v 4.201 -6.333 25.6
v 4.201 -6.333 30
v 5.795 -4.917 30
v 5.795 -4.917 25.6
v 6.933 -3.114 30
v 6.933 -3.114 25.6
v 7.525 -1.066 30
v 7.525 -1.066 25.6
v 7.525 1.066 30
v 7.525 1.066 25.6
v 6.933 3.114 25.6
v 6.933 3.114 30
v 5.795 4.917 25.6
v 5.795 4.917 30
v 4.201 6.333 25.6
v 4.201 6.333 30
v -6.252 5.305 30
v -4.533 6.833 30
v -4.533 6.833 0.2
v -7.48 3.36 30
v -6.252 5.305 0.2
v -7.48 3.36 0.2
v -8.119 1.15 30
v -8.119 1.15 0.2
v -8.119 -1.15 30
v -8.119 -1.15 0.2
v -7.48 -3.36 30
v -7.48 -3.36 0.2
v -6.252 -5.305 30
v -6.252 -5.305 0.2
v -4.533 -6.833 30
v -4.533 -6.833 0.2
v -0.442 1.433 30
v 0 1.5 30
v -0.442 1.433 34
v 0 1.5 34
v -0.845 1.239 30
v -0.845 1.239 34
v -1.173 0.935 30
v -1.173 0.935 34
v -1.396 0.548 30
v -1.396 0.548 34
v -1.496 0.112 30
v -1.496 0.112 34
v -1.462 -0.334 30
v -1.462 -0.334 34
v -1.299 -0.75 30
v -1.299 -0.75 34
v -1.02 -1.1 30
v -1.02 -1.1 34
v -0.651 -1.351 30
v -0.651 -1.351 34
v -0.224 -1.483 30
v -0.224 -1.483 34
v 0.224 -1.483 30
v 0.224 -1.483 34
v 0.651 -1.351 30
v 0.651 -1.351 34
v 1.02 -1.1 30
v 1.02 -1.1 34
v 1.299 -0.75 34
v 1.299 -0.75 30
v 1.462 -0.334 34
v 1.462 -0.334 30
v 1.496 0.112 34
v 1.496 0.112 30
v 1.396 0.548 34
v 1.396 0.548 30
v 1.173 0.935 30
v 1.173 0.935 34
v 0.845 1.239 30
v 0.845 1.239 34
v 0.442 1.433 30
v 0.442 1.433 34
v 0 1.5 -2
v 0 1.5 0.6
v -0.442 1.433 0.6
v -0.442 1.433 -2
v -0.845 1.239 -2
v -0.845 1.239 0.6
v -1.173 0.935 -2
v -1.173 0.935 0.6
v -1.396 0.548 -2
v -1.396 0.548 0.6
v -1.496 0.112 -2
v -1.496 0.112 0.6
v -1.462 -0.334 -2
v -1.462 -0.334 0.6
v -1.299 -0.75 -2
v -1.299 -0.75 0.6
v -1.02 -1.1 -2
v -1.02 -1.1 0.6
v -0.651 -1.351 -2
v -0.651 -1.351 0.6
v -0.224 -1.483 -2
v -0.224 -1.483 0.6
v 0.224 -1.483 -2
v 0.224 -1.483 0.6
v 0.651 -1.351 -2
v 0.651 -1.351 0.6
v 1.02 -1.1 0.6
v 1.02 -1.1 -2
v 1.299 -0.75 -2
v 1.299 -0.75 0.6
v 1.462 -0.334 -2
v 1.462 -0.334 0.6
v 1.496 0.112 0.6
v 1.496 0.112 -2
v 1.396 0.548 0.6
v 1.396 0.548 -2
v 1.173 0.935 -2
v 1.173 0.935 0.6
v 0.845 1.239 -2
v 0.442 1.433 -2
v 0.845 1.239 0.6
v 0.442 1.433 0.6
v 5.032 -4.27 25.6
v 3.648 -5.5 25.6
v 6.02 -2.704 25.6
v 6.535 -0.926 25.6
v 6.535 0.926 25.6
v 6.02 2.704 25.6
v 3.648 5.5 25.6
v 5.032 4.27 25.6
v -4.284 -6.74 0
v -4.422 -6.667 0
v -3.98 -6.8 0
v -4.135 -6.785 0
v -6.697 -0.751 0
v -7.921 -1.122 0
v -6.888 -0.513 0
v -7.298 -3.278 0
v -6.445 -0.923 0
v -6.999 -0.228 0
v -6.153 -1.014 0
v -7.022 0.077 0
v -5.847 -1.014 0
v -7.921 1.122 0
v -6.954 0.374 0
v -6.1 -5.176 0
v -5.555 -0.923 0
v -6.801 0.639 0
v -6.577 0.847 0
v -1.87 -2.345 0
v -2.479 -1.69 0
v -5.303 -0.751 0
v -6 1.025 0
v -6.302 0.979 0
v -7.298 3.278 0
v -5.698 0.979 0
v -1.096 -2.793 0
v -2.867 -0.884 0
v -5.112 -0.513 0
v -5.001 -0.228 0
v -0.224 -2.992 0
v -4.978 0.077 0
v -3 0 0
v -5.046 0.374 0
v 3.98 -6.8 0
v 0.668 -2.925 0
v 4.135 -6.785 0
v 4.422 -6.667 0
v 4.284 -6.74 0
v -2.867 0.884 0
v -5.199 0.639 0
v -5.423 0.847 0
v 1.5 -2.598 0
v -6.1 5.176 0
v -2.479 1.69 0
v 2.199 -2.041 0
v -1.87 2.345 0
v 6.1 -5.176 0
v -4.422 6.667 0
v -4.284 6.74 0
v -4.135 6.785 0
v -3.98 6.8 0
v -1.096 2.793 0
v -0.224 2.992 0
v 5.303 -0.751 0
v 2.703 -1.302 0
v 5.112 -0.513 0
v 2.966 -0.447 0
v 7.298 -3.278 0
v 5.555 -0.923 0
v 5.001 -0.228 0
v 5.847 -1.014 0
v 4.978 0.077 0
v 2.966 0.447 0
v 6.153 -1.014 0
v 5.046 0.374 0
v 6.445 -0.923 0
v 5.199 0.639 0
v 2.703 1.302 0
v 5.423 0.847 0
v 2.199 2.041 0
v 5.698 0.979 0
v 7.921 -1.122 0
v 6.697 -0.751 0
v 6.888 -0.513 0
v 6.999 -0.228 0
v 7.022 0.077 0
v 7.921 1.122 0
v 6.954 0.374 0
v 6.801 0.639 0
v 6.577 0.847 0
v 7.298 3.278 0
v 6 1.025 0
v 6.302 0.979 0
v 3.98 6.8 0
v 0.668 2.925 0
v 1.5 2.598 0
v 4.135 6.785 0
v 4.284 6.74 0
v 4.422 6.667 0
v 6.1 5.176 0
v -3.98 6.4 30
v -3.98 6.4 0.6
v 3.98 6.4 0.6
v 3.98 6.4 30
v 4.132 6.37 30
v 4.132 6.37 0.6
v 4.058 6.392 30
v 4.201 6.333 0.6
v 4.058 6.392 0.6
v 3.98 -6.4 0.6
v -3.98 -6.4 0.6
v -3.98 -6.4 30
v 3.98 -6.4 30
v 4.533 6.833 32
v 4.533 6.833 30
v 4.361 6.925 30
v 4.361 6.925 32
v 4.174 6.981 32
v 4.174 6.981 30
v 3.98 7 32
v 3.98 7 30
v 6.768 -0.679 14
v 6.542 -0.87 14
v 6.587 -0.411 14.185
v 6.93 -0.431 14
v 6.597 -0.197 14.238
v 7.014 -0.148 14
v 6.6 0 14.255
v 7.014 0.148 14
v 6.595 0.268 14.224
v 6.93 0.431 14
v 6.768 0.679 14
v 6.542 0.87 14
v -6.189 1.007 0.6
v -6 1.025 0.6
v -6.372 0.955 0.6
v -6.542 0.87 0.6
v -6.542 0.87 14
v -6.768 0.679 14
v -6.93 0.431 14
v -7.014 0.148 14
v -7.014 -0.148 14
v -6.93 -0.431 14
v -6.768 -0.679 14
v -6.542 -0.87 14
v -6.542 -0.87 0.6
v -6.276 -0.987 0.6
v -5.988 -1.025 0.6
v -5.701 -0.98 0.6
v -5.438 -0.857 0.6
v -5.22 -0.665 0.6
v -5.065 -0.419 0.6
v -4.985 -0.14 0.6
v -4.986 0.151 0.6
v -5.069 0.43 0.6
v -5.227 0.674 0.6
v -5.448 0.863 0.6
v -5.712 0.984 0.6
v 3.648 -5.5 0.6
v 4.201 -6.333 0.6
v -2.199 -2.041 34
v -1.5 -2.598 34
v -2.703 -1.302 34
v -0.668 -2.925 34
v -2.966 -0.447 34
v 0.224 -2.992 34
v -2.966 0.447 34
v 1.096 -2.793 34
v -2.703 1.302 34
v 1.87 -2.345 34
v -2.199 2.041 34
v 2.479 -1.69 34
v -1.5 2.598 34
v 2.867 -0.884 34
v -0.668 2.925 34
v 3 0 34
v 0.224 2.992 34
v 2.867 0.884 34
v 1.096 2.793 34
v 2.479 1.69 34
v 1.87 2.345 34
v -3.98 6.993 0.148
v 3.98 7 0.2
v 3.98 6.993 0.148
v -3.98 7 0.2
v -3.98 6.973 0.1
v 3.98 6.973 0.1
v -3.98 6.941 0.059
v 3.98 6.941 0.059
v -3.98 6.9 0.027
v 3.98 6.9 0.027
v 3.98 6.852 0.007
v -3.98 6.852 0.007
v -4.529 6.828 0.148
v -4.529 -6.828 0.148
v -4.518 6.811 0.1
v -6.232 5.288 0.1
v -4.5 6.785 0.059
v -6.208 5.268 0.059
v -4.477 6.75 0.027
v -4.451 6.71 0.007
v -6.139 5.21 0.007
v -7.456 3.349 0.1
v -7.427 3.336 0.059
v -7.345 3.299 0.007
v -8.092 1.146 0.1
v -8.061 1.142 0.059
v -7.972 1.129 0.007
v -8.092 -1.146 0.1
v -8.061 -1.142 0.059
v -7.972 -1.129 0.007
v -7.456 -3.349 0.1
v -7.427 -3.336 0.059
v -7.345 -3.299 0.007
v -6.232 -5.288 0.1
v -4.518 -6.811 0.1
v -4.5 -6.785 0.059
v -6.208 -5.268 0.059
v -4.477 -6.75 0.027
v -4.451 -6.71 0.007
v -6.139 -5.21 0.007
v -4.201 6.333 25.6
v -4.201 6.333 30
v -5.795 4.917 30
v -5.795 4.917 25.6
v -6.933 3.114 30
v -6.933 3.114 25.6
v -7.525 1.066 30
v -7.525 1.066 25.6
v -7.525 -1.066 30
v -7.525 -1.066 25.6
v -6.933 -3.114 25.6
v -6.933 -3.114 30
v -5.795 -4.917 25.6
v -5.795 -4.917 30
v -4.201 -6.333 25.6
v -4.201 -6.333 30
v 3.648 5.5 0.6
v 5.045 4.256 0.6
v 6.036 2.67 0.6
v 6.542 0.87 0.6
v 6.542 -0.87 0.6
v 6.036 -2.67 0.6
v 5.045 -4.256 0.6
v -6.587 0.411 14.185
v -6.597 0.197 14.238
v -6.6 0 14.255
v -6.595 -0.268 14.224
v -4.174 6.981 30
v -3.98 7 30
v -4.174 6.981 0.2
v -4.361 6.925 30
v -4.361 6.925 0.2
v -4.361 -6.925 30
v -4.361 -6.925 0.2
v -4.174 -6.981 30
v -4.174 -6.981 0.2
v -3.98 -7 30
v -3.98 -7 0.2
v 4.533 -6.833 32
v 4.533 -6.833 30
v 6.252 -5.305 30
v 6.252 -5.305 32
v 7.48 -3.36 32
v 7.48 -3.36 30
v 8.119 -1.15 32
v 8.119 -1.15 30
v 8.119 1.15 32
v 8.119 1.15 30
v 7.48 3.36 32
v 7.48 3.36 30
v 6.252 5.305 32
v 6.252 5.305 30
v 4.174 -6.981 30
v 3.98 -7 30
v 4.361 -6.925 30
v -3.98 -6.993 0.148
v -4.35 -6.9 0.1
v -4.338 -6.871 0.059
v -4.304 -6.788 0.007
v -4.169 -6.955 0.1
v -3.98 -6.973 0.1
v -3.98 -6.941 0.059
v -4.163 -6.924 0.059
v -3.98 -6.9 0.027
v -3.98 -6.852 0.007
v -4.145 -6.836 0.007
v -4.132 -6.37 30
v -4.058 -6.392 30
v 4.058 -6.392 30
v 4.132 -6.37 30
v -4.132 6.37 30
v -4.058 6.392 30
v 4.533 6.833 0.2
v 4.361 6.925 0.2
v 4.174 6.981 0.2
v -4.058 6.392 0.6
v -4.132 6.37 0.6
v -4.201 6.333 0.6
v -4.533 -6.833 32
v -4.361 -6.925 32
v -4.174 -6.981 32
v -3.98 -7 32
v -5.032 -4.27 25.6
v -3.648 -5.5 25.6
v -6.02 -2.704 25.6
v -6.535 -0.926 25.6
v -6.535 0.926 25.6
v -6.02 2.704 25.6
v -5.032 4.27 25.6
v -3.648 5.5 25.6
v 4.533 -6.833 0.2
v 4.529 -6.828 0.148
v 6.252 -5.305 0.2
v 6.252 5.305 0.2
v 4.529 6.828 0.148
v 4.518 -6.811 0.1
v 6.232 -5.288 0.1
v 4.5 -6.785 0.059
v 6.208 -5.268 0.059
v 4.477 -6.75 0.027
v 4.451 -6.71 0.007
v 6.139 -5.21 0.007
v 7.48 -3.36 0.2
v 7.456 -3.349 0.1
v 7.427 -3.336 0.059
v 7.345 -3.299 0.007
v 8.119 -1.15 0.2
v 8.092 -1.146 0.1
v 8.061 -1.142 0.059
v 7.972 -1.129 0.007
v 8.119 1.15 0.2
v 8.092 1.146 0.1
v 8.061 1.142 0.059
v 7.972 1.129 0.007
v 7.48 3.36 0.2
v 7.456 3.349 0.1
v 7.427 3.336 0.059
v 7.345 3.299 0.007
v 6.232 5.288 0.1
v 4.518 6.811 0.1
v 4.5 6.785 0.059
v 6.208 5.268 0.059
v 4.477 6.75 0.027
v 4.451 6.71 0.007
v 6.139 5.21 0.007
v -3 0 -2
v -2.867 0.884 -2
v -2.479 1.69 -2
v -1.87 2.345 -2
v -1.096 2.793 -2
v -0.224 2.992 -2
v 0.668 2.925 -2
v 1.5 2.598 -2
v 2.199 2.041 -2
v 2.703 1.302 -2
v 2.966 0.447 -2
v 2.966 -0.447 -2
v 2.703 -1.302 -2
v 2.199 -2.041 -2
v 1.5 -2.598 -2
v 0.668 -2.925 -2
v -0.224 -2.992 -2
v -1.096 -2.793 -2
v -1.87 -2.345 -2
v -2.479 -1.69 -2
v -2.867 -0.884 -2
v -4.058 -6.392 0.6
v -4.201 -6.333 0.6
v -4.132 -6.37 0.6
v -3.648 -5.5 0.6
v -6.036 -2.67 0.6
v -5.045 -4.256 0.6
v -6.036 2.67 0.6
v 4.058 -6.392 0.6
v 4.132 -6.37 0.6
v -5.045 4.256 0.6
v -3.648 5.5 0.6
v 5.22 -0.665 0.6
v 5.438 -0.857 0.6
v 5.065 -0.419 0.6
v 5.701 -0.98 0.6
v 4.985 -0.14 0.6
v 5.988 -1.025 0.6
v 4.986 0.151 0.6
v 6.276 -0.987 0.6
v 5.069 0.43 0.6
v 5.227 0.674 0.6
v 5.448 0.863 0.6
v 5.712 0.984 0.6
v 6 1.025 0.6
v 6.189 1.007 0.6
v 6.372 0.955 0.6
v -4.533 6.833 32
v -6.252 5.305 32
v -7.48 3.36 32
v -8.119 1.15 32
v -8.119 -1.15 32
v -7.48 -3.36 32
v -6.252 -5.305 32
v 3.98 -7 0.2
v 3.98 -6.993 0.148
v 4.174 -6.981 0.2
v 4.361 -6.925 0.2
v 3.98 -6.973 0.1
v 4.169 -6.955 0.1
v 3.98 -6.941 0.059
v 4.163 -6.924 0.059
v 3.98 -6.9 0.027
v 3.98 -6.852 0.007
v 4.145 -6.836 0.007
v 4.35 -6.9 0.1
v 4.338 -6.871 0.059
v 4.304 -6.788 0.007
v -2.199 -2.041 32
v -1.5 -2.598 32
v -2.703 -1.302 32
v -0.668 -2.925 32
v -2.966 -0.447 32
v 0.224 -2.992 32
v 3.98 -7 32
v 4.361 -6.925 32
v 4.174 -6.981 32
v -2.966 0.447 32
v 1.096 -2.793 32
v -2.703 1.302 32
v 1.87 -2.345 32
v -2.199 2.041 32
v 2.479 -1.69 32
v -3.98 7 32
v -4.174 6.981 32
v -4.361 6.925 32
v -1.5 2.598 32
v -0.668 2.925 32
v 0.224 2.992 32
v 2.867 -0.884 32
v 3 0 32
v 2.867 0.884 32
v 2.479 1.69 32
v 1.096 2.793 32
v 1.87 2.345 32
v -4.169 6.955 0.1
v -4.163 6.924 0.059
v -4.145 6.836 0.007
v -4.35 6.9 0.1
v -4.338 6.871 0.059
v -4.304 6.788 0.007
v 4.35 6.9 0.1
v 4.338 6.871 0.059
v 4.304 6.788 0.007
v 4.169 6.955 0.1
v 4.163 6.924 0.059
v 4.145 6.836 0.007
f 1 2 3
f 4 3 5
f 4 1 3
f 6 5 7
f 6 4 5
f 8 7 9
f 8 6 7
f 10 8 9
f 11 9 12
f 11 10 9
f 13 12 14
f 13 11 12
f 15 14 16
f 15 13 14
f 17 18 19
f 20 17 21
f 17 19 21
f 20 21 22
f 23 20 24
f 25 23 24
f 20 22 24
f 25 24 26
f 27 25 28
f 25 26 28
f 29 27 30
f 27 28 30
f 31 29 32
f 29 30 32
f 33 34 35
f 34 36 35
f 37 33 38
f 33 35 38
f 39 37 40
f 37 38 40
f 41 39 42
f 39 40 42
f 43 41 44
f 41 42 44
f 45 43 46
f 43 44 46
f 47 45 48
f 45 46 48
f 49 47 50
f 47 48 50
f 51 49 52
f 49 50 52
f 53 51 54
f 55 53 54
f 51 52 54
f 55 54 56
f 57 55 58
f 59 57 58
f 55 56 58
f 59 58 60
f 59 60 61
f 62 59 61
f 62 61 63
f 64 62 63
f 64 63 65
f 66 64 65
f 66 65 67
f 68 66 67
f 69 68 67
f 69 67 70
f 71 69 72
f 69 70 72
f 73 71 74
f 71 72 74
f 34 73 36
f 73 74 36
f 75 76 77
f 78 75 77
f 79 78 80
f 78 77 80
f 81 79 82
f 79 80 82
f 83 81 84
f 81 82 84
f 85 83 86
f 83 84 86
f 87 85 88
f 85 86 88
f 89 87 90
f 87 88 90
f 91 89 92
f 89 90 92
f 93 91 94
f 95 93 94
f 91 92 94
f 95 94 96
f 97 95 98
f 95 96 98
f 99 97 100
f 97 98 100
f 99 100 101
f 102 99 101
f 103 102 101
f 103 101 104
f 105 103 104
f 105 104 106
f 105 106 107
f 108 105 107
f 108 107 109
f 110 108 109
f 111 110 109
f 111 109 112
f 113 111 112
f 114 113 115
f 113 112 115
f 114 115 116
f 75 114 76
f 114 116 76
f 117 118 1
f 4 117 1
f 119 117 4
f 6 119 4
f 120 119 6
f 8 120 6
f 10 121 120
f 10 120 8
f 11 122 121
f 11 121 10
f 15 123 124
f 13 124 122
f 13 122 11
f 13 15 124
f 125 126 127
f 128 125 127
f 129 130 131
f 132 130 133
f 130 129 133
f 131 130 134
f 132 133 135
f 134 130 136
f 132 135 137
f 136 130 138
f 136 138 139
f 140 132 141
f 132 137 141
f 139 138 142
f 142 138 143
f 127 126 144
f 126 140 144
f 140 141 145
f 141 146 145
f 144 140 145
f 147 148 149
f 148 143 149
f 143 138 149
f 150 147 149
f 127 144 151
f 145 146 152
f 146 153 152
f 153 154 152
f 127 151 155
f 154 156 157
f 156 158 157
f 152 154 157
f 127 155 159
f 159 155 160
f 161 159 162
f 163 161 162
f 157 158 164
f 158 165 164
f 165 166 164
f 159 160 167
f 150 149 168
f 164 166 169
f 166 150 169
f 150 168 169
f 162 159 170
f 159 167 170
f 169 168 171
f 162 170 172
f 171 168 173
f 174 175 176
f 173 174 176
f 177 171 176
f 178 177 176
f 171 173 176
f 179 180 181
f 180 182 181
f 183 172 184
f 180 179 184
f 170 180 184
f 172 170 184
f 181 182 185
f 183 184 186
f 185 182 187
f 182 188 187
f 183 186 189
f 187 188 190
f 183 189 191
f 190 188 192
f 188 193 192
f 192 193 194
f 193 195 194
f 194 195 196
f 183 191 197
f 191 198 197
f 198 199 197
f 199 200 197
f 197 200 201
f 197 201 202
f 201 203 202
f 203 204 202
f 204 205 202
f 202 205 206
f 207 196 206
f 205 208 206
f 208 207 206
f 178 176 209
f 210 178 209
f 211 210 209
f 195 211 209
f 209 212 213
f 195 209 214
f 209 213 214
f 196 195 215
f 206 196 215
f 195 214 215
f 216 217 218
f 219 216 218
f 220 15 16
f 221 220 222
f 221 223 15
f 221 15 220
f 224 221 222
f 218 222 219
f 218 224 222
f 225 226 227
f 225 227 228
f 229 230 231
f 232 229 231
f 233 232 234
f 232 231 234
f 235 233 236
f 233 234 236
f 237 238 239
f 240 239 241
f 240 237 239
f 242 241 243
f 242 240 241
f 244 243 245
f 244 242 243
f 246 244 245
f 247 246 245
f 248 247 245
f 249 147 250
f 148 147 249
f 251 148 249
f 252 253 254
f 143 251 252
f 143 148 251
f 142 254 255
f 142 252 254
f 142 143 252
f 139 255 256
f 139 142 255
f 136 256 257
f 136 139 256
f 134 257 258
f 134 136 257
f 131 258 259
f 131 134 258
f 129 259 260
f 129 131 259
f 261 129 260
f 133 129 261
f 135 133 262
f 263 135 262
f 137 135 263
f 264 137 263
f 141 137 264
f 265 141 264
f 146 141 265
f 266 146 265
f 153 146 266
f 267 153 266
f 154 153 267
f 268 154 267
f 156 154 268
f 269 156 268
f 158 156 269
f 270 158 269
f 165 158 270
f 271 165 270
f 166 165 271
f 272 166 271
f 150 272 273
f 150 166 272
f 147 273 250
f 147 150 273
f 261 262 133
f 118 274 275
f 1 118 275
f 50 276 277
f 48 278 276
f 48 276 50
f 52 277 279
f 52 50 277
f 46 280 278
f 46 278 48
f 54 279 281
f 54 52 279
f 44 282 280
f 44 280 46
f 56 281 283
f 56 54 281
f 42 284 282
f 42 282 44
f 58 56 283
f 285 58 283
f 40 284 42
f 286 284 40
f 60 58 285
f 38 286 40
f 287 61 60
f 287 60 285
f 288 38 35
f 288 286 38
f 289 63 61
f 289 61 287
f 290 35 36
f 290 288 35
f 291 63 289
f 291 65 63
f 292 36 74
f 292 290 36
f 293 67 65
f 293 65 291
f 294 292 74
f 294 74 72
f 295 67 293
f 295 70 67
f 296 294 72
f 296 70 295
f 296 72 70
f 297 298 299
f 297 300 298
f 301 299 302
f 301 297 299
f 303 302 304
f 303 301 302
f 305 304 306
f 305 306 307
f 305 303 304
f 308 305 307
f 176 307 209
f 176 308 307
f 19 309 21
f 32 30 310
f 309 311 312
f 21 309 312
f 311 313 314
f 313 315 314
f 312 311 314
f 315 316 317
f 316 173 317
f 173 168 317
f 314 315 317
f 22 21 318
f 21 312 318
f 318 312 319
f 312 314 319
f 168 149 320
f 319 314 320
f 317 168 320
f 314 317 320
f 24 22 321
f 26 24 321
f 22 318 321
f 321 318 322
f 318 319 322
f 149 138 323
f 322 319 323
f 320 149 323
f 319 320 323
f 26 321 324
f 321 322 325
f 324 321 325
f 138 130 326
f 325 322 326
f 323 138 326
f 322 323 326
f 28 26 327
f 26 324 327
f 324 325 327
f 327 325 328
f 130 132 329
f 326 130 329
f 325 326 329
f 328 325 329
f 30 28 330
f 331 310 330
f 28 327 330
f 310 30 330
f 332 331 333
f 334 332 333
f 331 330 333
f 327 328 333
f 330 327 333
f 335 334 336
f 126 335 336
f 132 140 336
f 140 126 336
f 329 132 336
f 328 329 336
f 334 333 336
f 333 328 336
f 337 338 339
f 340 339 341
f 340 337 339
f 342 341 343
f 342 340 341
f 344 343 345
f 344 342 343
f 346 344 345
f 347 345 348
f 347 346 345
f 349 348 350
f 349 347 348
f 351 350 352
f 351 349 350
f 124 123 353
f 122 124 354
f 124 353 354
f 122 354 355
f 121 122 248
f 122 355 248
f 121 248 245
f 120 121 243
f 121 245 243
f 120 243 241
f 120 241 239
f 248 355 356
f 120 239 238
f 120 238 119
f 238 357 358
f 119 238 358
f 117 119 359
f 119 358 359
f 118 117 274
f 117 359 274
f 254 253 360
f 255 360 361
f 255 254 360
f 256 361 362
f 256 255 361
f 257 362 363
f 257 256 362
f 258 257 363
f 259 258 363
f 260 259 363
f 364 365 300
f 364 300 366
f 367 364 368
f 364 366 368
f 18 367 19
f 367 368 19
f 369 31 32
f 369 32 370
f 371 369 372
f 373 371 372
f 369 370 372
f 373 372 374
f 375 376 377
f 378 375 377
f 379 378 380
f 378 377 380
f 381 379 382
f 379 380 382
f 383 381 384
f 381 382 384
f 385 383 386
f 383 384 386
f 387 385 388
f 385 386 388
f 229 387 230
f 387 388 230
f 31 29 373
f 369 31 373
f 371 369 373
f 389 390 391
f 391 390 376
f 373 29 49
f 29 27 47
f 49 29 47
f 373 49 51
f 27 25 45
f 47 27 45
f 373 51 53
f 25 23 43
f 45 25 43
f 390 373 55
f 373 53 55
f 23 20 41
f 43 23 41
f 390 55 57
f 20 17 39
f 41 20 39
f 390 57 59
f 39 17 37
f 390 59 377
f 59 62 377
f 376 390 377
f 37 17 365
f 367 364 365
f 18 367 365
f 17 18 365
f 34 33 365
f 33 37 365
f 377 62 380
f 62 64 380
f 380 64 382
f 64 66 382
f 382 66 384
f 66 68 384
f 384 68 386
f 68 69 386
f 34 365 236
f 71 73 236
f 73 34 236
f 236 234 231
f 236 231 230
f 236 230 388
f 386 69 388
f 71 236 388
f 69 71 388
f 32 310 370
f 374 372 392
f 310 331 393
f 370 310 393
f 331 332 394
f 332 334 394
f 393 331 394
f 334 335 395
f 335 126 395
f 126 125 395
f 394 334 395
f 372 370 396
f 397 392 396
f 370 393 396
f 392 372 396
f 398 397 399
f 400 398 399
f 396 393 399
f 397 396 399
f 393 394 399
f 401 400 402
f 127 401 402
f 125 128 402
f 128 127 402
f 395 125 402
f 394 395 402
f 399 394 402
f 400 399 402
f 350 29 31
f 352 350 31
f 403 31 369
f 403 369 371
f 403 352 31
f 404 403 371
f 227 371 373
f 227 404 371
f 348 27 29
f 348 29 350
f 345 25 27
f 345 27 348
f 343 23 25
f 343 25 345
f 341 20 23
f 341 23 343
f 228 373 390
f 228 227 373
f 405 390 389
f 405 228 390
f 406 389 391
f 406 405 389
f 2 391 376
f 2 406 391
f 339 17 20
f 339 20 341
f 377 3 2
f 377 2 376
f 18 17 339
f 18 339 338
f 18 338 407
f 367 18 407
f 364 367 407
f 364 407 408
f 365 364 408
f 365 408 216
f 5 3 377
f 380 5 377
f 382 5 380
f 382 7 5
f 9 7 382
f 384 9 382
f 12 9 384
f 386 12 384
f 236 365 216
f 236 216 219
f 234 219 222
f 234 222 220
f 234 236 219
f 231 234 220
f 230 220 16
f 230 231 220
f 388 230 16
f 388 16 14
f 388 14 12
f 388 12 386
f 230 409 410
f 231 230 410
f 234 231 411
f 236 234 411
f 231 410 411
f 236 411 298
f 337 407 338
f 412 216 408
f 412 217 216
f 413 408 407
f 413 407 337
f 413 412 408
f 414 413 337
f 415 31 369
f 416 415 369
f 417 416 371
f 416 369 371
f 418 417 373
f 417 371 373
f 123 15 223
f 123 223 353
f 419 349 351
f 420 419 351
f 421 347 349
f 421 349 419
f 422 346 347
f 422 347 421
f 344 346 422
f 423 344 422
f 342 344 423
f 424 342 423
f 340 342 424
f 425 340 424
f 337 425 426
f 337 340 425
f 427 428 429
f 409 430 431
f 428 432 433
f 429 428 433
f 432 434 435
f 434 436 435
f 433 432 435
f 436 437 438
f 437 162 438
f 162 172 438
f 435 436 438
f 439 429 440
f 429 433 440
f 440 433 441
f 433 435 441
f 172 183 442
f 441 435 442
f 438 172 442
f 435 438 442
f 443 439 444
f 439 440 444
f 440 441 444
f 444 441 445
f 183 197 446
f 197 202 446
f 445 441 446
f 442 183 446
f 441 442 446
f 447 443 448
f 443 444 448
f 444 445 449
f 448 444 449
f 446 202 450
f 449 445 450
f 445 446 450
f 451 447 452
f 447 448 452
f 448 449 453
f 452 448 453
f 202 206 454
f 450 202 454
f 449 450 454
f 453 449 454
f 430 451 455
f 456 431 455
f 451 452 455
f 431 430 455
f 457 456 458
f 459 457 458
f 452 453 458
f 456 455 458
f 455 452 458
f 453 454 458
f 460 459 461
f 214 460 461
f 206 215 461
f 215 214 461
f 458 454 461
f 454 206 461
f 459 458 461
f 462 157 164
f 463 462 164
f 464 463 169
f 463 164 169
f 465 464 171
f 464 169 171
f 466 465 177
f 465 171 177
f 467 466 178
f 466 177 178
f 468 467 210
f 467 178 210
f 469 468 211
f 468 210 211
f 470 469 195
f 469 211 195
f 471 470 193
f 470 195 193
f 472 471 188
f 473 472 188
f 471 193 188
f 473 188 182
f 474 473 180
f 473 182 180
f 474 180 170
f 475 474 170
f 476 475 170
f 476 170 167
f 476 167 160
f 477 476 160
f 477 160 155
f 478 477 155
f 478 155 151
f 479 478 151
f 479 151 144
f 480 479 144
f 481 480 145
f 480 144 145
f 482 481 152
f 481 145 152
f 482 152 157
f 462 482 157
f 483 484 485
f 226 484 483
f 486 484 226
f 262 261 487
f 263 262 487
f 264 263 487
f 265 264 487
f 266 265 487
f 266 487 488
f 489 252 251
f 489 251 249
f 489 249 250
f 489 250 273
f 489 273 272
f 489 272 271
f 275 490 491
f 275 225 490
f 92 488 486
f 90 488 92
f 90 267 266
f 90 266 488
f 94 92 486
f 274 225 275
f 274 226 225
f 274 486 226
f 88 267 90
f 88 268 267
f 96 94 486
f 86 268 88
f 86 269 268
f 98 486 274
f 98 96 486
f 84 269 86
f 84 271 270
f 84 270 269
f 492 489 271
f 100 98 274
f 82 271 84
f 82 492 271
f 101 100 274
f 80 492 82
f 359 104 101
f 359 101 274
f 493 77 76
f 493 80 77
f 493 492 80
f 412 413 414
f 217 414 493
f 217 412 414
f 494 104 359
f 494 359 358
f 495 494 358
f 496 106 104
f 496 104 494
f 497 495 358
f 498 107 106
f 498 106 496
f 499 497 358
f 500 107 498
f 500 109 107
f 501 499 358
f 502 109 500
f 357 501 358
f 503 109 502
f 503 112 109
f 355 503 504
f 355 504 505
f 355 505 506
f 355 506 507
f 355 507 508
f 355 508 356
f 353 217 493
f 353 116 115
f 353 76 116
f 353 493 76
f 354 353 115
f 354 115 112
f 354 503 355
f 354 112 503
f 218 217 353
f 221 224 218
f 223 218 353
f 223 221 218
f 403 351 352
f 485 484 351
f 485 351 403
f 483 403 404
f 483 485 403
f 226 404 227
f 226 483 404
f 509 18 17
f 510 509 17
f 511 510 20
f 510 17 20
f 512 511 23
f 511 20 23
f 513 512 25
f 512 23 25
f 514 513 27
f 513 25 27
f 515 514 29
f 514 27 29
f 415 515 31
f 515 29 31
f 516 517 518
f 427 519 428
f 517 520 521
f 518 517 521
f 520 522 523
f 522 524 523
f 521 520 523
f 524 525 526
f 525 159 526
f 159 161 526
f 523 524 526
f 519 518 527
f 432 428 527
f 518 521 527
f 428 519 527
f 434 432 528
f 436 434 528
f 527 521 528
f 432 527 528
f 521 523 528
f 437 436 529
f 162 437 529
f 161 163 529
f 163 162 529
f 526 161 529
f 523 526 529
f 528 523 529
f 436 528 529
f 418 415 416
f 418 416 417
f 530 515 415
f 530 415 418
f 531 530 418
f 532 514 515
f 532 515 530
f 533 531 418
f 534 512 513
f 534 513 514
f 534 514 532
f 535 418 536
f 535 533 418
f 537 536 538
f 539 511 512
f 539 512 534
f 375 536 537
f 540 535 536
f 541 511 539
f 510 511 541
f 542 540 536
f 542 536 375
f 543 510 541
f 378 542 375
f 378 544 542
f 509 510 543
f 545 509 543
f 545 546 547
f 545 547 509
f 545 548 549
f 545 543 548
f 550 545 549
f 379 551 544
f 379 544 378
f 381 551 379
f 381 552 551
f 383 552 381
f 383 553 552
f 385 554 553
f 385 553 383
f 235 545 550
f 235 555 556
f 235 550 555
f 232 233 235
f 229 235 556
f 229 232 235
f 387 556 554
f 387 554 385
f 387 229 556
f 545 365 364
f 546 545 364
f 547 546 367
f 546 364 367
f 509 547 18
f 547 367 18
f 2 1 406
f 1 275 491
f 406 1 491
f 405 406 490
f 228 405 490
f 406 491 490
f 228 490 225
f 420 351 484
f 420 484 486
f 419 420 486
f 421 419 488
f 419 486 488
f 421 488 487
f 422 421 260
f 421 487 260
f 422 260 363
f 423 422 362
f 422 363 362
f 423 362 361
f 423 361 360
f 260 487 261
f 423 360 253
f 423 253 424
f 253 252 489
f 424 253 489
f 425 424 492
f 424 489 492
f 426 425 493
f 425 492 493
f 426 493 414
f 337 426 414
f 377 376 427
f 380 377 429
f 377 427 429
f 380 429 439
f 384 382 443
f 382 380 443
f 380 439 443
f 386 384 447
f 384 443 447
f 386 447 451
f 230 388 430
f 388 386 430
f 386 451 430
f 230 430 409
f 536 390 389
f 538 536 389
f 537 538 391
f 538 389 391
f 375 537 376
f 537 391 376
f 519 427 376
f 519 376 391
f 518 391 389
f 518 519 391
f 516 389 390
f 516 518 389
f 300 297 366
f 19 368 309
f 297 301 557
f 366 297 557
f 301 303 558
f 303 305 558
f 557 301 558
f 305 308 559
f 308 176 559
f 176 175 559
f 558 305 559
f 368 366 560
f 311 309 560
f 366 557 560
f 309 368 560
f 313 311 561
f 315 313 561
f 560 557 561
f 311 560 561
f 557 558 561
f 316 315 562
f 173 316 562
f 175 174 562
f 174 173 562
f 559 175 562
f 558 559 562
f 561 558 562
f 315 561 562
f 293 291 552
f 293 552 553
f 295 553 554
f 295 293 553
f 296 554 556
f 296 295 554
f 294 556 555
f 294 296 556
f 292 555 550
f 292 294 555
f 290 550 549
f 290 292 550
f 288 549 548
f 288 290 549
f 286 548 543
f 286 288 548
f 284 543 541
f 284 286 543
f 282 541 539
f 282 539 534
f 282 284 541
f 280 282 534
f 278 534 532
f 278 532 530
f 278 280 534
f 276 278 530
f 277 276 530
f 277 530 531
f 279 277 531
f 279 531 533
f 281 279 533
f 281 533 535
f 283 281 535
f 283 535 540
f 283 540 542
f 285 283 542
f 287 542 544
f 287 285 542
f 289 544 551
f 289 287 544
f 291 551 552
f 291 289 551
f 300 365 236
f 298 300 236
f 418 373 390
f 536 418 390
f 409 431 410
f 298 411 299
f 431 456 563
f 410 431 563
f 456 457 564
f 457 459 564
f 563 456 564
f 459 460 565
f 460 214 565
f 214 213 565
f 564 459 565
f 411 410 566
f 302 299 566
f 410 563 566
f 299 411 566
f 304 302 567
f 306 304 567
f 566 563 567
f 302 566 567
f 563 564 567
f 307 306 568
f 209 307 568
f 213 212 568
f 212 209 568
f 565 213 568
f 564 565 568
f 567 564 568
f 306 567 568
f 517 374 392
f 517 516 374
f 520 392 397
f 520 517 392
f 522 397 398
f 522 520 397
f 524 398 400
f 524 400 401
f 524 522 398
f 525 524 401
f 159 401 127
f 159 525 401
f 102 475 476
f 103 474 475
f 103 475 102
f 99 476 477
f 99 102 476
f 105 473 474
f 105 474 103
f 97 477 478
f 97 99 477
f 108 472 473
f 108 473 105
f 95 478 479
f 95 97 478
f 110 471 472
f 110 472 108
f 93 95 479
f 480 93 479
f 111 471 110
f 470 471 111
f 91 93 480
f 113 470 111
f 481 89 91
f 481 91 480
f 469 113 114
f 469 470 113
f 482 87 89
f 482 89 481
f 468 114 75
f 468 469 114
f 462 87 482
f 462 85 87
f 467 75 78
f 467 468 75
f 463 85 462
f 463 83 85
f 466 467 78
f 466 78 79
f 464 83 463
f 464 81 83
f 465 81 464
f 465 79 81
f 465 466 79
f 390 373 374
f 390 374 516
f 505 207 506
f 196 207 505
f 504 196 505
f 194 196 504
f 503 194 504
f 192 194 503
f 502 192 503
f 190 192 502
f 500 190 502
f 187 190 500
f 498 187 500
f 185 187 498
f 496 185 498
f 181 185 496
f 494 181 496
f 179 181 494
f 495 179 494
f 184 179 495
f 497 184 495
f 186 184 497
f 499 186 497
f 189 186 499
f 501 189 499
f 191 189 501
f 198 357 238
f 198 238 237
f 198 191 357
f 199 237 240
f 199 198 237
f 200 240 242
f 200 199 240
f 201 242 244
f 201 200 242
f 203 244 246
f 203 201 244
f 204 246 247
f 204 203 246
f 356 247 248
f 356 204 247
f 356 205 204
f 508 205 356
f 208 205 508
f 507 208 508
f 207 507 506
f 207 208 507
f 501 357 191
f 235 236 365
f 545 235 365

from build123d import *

# Parameters (mm, degrees)
SKETCH_1_R                    = 8.2
EXTRUDE_1_DEPTH               = 30
SKETCH_2_W                    = 19.841310119
SKETCH_2_H                    = 4.076981531
CUT_EXTRUDE_1_DEPTH           = 33.163333161
FILLET_1_R                    = 1
SHELL_1_T                     = -0.6
SKETCH_4_R                    = 3
EXTRUDE_2_DEPTH               = 2
EXTRUDE_1_2_DEPTH             = 25
EXTRUDE_3_DEPTH               = 2
EXTRUDE_START                 = 2
SKETCH_9_R                    = 3
EXTRUDE_4_DEPTH               = 2
SKETCH_6_W                    = 1.5
SKETCH_6_H                    = 36
FILLET_2_R                    = 0.2
HOLE_WIZARD_M2_5_1_AT_2_COUNT = 2
HOLE_WIZARD_M2_5_1_AT_2_PITCH = 12


with BuildPart() as part:
    # 草图1 → Extrude 1 (new body)
    with BuildSketch(Plane.XY):
        Circle(SKETCH_1_R)
    extrude(amount=EXTRUDE_1_DEPTH)

    # 草图2 → 切除-拉伸1 (cut, through all)
    with BuildSketch(Plane.XY.offset(30)):
        with Locations((0.815396306, 9.038490766)):
            Rectangle(SKETCH_2_W, SKETCH_2_H)
        with Locations((0.815396306, -9.038490766)):
            Rectangle(SKETCH_2_W, SKETCH_2_H)
    extrude(amount=-CUT_EXTRUDE_1_DEPTH, mode=Mode.SUBTRACT)

    # 圆角1
    fillet_1_edges = [part.edges().sort_by_distance(p)[0] for p in [
        (-4.270831301, 7, 15),
        (4.270831301, 7, 15),
        (4.270831301, -7, 15),
        (-4.270831301, -7, 15),
    ]]
    fillet(fillet_1_edges, radius=FILLET_1_R)

    # 抽壳1
    shell_1_openings = [part.faces().sort_by_distance(p)[0] for p in [
        (0, 0, 30),
    ]]
    offset(amount=SHELL_1_T, openings=shell_1_openings, kind=Kind.INTERSECTION)

    # 草图4 → 凸台-拉伸2 (add)
    with BuildSketch(Plane(origin=(0, 0, 0), x_dir=(-1, 0, 0), z_dir=(0, 0, -1))):
        Circle(SKETCH_4_R)
    extrude(amount=EXTRUDE_2_DEPTH)

    # 草图7 → Extrude 1 2 (add)
    with BuildSketch(Plane.XY.offset(0.6)):
        with BuildLine():
            ThreePointArc((-4.201058068, 6.333333333), (-7.6, 0), (-4.201058068, -6.333333333))
            Line((-4.201058068, -6.333333333), (-3.648287269, -5.5))
            ThreePointArc((-3.648287269, -5.5), (-6.6, 0), (-3.648287269, 5.5))
            Line((-3.648287269, 5.5), (-4.201058068, 6.333333333))
        make_face()
        with BuildLine():
            ThreePointArc((4.201058068, -6.333333333), (7.6, 0), (4.201058068, 6.333333333))
            Line((4.201058068, 6.333333333), (3.648287269, 5.5))
            ThreePointArc((3.648287269, 5.5), (6.6, 0), (3.648287269, -5.5))
            Line((3.648287269, -5.5), (4.201058068, -6.333333333))
        make_face()
    extrude(amount=EXTRUDE_1_2_DEPTH)


with BuildPart() as body_2:
    # 草图8 → 凸台-拉伸3 (new body)
    with BuildSketch(Plane.XY.offset(30)):
        with BuildLine():
            Line((-3.979949748, -7), (3.979949748, -7))
            ThreePointArc((3.979949748, -7), (4.268624883, -6.957427108), (4.532720547, -6.833333333))
            ThreePointArc((4.532720547, -6.833333333), (8.2, 0), (4.532720547, 6.833333333))
            ThreePointArc((4.532720547, 6.833333333), (4.268624883, 6.957427108), (3.979949748, 7))
            Line((3.979949748, 7), (-3.979949748, 7))
            ThreePointArc((-3.979949748, 7), (-4.268624883, 6.957427108), (-4.532720547, 6.833333333))
            ThreePointArc((-4.532720547, 6.833333333), (-8.2, 0), (-4.532720547, -6.833333333))
            ThreePointArc((-4.532720547, -6.833333333), (-4.268624883, -6.957427108), (-3.979949748, -7))
        make_face()
    extrude(amount=EXTRUDE_3_DEPTH)

    # 草图9 → 凸台-拉伸4 (add)
    with BuildSketch(Plane.XY.offset(32).offset(EXTRUDE_START)):
        Circle(SKETCH_9_R)
    extrude(amount=-EXTRUDE_4_DEPTH)


with BuildPart() as hole_wizard_3_0_3_1_tool:
    # 草图6 → Ø3.0 (3) 直径孔1 (revolve)
    with BuildSketch(Plane(origin=(0, 0, -2), x_dir=(0, 1, 0), z_dir=(1, 0, 0))):
        with Locations((0.75, 18)):
            Rectangle(SKETCH_6_W, SKETCH_6_H)
    revolve(axis=Axis((0, 0, -8.35), (0, 0, 1)))


with BuildPart() as part_1:
    add(part.part)

    # Ø3.0 (3) 直径孔1: cut by hole_wizard_3_0_3_1_tool
    add(hole_wizard_3_0_3_1_tool.part, mode=Mode.SUBTRACT)

    # 圆角2
    fillet_2_edges = [part_1.edges().sort_by_distance(p)[0] for p in [
        (-8.2, 0, 0),
        (0, -7, 0),
        (0, 7, 0),
        (8.2, 0, 0),
        (4.268624883, 6.957427108, 0),
        (-4.268624883, 6.957427108, 0),
        (4.268624883, -6.957427108, 0),
        (-4.268624883, -6.957427108, 0),
    ]]
    fillet(fillet_2_edges, radius=FILLET_2_R)

    # 草图14 → M2.5 螺纹孔1 (revolve, cut)
    with BuildSketch(Plane.YZ.offset(6)):
        Polygon((0, 0), (0, 14.615882135), (1.025, 14), (1.025, 0), align=None)
    hole_wizard_m2_5_1 = revolve(axis=Axis((6, 0, -6.35), (0, 0, 1)), mode=Mode.SUBTRACT)

    # M2.5 螺纹孔1 at 2: M2.5 螺纹孔1 ×2
    with Locations(*[(-i * HOLE_WIZARD_M2_5_1_AT_2_PITCH, 0, 0) for i in range(1, HOLE_WIZARD_M2_5_1_AT_2_COUNT)]):
        add(hole_wizard_m2_5_1, mode=Mode.SUBTRACT)


with BuildPart() as body_2_1:
    add(body_2.part)

    # Ø3.0 (3) 直径孔1: cut by hole_wizard_3_0_3_1_tool
    add(hole_wizard_3_0_3_1_tool.part, mode=Mode.SUBTRACT)


solid = Compound([part_1.part, body_2_1.part])
